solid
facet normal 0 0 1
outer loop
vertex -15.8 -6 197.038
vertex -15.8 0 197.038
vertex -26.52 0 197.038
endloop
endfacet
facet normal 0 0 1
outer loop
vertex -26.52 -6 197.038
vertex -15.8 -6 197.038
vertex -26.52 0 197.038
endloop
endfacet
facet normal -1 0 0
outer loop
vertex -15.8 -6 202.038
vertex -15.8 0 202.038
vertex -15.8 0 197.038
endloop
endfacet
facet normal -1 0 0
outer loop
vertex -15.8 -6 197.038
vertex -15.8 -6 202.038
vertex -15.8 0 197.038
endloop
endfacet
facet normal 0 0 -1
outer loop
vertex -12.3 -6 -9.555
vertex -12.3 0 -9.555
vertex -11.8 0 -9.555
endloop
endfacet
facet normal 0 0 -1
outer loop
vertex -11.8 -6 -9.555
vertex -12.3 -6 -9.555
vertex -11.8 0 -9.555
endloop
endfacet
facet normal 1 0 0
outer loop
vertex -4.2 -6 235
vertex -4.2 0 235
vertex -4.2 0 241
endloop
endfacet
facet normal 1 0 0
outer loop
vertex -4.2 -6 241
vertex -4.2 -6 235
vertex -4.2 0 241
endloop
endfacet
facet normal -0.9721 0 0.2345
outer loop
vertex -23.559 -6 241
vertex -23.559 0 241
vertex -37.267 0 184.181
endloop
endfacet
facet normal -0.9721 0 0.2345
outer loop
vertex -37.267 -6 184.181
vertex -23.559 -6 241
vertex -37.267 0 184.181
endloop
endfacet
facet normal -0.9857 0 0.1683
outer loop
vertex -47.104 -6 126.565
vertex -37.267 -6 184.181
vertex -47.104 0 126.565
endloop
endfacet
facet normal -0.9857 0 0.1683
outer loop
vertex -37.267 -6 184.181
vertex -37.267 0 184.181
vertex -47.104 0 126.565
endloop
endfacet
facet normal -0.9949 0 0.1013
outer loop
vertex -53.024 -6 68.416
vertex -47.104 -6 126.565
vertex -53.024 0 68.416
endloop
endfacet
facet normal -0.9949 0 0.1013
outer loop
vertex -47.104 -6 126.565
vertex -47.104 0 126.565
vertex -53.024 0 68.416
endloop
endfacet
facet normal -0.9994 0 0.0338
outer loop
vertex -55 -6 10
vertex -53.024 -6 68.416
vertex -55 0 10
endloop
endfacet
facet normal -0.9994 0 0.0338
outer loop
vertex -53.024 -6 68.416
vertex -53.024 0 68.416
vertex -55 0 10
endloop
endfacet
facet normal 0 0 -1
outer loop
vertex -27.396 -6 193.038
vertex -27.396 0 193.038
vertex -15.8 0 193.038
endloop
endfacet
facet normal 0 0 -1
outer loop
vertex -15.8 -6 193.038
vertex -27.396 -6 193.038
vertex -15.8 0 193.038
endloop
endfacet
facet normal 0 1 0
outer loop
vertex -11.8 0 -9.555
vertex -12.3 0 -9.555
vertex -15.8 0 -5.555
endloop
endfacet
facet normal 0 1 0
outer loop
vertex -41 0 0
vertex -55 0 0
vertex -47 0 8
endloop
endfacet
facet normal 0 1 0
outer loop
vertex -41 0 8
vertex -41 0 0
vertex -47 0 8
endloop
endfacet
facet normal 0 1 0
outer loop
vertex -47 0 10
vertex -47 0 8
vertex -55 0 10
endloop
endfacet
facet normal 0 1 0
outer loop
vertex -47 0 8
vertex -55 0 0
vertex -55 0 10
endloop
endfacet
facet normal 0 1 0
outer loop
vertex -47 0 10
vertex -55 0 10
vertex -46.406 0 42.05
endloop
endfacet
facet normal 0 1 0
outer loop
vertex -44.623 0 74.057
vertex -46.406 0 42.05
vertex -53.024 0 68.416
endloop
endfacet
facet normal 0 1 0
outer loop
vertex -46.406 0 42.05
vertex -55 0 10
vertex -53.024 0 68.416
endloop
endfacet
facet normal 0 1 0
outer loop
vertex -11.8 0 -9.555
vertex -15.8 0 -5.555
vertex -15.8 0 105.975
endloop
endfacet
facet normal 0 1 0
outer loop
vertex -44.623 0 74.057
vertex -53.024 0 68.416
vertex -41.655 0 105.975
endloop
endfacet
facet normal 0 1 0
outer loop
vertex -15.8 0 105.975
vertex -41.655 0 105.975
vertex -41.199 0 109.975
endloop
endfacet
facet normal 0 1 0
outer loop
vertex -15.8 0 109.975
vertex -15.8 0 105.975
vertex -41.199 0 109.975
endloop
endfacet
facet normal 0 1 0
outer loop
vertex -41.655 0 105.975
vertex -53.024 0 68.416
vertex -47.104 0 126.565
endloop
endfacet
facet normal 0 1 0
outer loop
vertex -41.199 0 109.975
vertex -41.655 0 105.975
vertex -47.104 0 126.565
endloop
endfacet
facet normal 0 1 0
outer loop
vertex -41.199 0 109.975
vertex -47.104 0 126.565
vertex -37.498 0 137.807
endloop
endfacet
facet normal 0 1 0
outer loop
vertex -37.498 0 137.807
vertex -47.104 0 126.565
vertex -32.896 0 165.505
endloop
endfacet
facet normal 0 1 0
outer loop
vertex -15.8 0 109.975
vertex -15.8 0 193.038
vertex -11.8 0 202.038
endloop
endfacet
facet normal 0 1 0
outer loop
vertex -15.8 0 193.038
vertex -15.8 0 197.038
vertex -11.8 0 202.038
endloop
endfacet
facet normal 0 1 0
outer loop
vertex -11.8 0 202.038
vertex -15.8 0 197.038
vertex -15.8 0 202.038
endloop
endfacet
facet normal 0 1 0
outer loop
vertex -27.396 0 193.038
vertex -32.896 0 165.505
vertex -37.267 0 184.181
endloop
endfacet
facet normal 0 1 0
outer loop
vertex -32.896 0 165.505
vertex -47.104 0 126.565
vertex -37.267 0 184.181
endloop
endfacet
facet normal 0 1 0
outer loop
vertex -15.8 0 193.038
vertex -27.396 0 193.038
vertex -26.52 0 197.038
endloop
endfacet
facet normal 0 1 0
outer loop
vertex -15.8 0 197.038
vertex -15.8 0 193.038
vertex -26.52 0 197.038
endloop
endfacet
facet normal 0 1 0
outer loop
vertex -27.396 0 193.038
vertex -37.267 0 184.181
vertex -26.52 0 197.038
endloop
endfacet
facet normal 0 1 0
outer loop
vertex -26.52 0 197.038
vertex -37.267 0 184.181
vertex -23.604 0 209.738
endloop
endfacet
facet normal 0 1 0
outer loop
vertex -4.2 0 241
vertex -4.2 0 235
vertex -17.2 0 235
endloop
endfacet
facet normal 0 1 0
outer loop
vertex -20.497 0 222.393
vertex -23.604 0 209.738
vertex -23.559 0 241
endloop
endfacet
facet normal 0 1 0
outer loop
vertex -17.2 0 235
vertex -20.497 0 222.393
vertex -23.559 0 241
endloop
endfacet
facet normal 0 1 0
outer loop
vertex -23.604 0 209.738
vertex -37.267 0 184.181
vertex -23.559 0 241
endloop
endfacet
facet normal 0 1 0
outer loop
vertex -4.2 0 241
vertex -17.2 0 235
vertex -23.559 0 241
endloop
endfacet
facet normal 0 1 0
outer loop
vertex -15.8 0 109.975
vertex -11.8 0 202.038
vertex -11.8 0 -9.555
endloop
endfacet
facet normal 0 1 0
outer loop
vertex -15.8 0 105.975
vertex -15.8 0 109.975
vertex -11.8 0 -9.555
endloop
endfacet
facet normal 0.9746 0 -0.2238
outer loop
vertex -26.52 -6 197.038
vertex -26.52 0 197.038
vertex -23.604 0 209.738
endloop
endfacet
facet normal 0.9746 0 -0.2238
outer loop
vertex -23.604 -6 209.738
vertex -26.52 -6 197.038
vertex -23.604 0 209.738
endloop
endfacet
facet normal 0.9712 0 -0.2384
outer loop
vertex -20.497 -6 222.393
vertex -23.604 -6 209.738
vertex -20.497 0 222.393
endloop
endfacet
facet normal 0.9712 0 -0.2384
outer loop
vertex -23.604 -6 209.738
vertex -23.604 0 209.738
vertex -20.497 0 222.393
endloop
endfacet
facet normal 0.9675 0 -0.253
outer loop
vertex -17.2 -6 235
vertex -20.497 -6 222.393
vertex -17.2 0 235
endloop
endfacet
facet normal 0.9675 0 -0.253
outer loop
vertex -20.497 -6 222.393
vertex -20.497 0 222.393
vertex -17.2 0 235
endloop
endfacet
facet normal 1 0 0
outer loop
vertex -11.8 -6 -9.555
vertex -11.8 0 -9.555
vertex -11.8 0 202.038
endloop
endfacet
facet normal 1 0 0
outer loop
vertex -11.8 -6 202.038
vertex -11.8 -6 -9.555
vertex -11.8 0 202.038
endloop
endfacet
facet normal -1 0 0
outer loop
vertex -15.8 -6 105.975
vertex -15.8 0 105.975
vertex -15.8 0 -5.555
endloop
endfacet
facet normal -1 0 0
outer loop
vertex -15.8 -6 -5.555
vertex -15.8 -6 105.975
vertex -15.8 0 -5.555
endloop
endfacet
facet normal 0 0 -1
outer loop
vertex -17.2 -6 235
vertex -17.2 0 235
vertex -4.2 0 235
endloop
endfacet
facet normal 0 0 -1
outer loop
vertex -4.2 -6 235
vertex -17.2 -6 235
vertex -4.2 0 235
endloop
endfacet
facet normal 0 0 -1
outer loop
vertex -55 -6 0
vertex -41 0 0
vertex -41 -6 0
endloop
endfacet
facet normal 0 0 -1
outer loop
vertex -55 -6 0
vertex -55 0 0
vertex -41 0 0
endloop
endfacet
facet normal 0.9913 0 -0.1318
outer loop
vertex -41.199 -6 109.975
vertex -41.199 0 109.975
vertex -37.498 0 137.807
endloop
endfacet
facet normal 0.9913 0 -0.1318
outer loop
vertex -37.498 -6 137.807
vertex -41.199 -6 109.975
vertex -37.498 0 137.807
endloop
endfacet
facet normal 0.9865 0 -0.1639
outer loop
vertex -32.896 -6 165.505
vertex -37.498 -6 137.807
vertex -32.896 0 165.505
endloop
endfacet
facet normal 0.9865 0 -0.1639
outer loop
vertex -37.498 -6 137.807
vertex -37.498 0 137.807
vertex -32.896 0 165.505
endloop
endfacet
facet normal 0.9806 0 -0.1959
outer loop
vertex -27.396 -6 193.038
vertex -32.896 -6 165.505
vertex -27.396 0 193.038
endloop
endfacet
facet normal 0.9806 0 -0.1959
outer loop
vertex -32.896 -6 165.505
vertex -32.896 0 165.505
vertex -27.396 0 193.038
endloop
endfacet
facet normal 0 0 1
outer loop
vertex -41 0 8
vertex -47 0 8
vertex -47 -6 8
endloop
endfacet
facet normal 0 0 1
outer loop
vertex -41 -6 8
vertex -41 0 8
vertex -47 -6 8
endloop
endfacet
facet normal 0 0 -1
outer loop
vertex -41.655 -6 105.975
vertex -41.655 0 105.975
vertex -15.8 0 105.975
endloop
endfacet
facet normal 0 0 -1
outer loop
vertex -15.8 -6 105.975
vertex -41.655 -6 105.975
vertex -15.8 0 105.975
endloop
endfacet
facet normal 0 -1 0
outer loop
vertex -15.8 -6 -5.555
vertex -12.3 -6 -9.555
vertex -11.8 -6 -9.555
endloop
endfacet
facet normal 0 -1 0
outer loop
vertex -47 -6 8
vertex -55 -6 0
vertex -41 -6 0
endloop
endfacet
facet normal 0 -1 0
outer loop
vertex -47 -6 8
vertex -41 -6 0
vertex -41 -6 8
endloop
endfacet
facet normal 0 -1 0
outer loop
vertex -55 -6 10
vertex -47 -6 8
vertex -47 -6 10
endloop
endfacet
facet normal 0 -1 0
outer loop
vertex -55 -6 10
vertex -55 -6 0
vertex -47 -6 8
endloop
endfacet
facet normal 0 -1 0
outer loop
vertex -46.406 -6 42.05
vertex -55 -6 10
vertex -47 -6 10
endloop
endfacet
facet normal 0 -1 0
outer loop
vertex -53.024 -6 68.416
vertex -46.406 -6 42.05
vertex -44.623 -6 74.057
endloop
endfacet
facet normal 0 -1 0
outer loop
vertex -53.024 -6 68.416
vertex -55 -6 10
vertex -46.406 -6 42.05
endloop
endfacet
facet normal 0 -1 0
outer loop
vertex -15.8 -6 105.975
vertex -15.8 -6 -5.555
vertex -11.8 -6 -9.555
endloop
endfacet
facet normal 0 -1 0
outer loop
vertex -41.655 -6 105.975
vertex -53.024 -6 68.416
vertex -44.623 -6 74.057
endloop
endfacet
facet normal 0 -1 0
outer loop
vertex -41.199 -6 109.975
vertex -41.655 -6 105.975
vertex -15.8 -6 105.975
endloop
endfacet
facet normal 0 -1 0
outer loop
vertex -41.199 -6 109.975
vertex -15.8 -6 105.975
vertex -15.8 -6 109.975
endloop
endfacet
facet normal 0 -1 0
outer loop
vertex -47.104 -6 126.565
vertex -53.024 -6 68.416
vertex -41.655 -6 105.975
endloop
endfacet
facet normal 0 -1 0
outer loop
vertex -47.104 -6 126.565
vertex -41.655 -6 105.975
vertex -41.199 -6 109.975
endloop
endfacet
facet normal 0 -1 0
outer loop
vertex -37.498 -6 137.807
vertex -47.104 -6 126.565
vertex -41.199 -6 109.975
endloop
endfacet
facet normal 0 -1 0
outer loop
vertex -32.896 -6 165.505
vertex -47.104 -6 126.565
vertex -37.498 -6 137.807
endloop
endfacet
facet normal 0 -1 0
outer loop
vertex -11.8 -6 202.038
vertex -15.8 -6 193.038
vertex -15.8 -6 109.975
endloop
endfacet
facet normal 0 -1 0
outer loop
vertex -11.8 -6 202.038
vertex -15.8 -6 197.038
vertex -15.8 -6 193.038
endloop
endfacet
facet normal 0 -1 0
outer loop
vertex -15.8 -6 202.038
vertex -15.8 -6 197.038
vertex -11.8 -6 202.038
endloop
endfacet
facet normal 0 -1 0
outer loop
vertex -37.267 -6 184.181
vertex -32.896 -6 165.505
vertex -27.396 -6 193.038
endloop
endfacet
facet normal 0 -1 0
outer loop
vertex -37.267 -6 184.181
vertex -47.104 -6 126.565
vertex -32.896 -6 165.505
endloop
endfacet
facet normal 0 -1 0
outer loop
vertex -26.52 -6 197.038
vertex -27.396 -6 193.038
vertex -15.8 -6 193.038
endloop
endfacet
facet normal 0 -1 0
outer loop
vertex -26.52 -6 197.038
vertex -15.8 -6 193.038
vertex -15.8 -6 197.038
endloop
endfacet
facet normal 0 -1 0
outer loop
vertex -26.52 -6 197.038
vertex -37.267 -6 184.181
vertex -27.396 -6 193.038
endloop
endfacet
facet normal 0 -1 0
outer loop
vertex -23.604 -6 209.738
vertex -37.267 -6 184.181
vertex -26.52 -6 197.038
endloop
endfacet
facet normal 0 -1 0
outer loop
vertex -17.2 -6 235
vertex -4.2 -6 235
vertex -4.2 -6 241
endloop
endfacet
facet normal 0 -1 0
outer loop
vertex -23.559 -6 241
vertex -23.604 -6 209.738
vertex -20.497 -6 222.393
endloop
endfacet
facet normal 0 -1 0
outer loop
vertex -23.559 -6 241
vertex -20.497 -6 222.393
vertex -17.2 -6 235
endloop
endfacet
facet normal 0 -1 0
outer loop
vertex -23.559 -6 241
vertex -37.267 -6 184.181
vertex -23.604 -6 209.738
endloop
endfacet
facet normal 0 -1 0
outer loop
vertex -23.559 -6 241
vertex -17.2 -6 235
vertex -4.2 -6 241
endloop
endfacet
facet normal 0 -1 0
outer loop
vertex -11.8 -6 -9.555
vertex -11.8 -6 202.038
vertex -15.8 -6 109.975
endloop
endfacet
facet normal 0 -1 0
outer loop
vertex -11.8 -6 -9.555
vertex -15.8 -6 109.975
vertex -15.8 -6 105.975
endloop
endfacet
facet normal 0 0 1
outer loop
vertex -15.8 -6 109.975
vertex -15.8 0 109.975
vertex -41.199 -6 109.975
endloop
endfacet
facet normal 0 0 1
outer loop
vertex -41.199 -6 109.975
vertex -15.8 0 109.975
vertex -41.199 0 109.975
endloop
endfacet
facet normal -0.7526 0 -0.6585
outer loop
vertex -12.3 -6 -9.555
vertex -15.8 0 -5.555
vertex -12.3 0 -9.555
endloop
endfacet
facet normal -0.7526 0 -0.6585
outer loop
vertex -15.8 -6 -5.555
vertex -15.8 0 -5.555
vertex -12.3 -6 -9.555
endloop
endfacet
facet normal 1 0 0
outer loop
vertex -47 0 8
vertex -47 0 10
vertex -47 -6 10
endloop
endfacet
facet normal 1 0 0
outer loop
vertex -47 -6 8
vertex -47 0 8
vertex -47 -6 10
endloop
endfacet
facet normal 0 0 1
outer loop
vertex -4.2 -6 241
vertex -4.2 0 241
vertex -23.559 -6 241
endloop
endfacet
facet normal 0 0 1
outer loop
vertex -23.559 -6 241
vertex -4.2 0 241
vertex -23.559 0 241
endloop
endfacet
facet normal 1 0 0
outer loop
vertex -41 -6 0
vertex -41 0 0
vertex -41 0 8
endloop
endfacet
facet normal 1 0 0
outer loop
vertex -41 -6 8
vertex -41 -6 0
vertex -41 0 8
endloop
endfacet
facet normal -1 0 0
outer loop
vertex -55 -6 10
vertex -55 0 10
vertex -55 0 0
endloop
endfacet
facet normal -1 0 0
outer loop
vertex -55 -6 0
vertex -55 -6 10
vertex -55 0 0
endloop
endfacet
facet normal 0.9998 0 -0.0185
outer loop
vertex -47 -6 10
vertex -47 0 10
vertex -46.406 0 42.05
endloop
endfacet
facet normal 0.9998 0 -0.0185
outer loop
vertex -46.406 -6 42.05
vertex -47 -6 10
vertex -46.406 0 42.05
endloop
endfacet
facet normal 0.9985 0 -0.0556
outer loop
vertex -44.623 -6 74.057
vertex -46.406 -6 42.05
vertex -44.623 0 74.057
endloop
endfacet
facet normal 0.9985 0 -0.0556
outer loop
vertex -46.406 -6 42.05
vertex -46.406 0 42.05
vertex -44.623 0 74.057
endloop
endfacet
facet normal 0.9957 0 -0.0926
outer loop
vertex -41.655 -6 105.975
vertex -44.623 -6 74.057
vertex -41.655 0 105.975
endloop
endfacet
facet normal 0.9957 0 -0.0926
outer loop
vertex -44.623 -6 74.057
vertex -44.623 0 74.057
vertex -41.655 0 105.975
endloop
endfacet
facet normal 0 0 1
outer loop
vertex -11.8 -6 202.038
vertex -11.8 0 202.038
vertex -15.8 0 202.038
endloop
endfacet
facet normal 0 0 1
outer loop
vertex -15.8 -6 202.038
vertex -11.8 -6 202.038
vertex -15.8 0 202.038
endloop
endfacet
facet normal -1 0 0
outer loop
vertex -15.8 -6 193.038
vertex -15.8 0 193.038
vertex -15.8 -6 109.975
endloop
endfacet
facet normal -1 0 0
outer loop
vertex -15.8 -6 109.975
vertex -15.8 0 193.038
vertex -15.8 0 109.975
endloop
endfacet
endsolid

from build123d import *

# Parameters (mm, degrees)
F1_DEPTH = 6
F2_SIZE2 = 4
F2_SIZE  = 3.5
F3_DEPTH = 6
F4_DEPTH = 2


with BuildPart() as f1:
    # F0 (on Front) → F1 (new body)
    with BuildSketch(Plane.XZ):
        with BuildLine():
            Line((-17.2, 235), (-4.2, 235))
            Line((-4.2, 235), (-4.2, 241))
            Line((-4.2, 241), (-23.5591068412, 241))
            ThreePointArc((-23.5591068412, 241), (-47.1037067536, 126.5649280043), (-55, 10))
            Line((-55, 10), (-55, 0))
            Line((-55, 0), (-47, 0))
            Line((-47, 0), (-47, 10))
            ThreePointArc((-47, 10), (-45.6626874065, 58.0616713196), (-41.6548879545, 105.9746152759))
            Line((-41.6548879545, 105.9746152759), (-15.8, 105.9746152759))
            Line((-15.8, 105.9746152759), (-15.8, -9.5547260733))
            Line((-15.8, -9.5547260733), (-11.8, -9.5547260733))
            Line((-11.8, -9.5547260733), (-11.8, 197.0380991697))
            Line((-11.8, 197.0380991697), (-11.8, 202.0380991697))
            Line((-11.8, 202.0380991697), (-15.8, 202.0380991697))
            Line((-15.8, 202.0380991697), (-15.8, 197.0380991697))
            Line((-15.8, 197.0380991697), (-26.5197448355, 197.0380991697))
            ThreePointArc((-26.5197448355, 197.0380991697), (-22.0745066899, 216.0717428538), (-17.2, 235))
        make_face()
        with BuildLine():
            ThreePointArc((-41.198523154, 109.9746152759), (-35.3095909069, 151.6745341907), (-27.396421331, 193.0380991697))
            Line((-27.396421331, 193.0380991697), (-15.8, 193.0380991697))
            Line((-15.8, 193.0380991697), (-15.8, 109.9746152759))
            Line((-15.8, 109.9746152759), (-41.198523154, 109.9746152759))
        make_face(mode=Mode.SUBTRACT)
    extrude(amount=F1_DEPTH)

    # F2
    f2_edges = [f1.edges().sort_by_distance(p)[0] for p in [
        (-15.8, -3, -9.554726),
    ]]
    f2_side = f1.faces().sort_by_distance((-13.8, -3, -9.554726))[0]
    chamfer(f2_edges, length=F2_SIZE, length2=F2_SIZE2, reference=f2_side)

    # F3 (add): a face of the model
    f3_faces = [f1.faces().sort_by_distance(p)[0] for p in [
        (-47, -3, 5),
    ]]
    extrude(f3_faces, amount=F3_DEPTH)

    # F4 (cut): a face of the model
    f4_faces = [f1.faces().sort_by_distance(p)[0] for p in [
        (-44, -3, 10),
    ]]
    extrude(f4_faces, amount=-F4_DEPTH, mode=Mode.SUBTRACT)


solid = f1.part
